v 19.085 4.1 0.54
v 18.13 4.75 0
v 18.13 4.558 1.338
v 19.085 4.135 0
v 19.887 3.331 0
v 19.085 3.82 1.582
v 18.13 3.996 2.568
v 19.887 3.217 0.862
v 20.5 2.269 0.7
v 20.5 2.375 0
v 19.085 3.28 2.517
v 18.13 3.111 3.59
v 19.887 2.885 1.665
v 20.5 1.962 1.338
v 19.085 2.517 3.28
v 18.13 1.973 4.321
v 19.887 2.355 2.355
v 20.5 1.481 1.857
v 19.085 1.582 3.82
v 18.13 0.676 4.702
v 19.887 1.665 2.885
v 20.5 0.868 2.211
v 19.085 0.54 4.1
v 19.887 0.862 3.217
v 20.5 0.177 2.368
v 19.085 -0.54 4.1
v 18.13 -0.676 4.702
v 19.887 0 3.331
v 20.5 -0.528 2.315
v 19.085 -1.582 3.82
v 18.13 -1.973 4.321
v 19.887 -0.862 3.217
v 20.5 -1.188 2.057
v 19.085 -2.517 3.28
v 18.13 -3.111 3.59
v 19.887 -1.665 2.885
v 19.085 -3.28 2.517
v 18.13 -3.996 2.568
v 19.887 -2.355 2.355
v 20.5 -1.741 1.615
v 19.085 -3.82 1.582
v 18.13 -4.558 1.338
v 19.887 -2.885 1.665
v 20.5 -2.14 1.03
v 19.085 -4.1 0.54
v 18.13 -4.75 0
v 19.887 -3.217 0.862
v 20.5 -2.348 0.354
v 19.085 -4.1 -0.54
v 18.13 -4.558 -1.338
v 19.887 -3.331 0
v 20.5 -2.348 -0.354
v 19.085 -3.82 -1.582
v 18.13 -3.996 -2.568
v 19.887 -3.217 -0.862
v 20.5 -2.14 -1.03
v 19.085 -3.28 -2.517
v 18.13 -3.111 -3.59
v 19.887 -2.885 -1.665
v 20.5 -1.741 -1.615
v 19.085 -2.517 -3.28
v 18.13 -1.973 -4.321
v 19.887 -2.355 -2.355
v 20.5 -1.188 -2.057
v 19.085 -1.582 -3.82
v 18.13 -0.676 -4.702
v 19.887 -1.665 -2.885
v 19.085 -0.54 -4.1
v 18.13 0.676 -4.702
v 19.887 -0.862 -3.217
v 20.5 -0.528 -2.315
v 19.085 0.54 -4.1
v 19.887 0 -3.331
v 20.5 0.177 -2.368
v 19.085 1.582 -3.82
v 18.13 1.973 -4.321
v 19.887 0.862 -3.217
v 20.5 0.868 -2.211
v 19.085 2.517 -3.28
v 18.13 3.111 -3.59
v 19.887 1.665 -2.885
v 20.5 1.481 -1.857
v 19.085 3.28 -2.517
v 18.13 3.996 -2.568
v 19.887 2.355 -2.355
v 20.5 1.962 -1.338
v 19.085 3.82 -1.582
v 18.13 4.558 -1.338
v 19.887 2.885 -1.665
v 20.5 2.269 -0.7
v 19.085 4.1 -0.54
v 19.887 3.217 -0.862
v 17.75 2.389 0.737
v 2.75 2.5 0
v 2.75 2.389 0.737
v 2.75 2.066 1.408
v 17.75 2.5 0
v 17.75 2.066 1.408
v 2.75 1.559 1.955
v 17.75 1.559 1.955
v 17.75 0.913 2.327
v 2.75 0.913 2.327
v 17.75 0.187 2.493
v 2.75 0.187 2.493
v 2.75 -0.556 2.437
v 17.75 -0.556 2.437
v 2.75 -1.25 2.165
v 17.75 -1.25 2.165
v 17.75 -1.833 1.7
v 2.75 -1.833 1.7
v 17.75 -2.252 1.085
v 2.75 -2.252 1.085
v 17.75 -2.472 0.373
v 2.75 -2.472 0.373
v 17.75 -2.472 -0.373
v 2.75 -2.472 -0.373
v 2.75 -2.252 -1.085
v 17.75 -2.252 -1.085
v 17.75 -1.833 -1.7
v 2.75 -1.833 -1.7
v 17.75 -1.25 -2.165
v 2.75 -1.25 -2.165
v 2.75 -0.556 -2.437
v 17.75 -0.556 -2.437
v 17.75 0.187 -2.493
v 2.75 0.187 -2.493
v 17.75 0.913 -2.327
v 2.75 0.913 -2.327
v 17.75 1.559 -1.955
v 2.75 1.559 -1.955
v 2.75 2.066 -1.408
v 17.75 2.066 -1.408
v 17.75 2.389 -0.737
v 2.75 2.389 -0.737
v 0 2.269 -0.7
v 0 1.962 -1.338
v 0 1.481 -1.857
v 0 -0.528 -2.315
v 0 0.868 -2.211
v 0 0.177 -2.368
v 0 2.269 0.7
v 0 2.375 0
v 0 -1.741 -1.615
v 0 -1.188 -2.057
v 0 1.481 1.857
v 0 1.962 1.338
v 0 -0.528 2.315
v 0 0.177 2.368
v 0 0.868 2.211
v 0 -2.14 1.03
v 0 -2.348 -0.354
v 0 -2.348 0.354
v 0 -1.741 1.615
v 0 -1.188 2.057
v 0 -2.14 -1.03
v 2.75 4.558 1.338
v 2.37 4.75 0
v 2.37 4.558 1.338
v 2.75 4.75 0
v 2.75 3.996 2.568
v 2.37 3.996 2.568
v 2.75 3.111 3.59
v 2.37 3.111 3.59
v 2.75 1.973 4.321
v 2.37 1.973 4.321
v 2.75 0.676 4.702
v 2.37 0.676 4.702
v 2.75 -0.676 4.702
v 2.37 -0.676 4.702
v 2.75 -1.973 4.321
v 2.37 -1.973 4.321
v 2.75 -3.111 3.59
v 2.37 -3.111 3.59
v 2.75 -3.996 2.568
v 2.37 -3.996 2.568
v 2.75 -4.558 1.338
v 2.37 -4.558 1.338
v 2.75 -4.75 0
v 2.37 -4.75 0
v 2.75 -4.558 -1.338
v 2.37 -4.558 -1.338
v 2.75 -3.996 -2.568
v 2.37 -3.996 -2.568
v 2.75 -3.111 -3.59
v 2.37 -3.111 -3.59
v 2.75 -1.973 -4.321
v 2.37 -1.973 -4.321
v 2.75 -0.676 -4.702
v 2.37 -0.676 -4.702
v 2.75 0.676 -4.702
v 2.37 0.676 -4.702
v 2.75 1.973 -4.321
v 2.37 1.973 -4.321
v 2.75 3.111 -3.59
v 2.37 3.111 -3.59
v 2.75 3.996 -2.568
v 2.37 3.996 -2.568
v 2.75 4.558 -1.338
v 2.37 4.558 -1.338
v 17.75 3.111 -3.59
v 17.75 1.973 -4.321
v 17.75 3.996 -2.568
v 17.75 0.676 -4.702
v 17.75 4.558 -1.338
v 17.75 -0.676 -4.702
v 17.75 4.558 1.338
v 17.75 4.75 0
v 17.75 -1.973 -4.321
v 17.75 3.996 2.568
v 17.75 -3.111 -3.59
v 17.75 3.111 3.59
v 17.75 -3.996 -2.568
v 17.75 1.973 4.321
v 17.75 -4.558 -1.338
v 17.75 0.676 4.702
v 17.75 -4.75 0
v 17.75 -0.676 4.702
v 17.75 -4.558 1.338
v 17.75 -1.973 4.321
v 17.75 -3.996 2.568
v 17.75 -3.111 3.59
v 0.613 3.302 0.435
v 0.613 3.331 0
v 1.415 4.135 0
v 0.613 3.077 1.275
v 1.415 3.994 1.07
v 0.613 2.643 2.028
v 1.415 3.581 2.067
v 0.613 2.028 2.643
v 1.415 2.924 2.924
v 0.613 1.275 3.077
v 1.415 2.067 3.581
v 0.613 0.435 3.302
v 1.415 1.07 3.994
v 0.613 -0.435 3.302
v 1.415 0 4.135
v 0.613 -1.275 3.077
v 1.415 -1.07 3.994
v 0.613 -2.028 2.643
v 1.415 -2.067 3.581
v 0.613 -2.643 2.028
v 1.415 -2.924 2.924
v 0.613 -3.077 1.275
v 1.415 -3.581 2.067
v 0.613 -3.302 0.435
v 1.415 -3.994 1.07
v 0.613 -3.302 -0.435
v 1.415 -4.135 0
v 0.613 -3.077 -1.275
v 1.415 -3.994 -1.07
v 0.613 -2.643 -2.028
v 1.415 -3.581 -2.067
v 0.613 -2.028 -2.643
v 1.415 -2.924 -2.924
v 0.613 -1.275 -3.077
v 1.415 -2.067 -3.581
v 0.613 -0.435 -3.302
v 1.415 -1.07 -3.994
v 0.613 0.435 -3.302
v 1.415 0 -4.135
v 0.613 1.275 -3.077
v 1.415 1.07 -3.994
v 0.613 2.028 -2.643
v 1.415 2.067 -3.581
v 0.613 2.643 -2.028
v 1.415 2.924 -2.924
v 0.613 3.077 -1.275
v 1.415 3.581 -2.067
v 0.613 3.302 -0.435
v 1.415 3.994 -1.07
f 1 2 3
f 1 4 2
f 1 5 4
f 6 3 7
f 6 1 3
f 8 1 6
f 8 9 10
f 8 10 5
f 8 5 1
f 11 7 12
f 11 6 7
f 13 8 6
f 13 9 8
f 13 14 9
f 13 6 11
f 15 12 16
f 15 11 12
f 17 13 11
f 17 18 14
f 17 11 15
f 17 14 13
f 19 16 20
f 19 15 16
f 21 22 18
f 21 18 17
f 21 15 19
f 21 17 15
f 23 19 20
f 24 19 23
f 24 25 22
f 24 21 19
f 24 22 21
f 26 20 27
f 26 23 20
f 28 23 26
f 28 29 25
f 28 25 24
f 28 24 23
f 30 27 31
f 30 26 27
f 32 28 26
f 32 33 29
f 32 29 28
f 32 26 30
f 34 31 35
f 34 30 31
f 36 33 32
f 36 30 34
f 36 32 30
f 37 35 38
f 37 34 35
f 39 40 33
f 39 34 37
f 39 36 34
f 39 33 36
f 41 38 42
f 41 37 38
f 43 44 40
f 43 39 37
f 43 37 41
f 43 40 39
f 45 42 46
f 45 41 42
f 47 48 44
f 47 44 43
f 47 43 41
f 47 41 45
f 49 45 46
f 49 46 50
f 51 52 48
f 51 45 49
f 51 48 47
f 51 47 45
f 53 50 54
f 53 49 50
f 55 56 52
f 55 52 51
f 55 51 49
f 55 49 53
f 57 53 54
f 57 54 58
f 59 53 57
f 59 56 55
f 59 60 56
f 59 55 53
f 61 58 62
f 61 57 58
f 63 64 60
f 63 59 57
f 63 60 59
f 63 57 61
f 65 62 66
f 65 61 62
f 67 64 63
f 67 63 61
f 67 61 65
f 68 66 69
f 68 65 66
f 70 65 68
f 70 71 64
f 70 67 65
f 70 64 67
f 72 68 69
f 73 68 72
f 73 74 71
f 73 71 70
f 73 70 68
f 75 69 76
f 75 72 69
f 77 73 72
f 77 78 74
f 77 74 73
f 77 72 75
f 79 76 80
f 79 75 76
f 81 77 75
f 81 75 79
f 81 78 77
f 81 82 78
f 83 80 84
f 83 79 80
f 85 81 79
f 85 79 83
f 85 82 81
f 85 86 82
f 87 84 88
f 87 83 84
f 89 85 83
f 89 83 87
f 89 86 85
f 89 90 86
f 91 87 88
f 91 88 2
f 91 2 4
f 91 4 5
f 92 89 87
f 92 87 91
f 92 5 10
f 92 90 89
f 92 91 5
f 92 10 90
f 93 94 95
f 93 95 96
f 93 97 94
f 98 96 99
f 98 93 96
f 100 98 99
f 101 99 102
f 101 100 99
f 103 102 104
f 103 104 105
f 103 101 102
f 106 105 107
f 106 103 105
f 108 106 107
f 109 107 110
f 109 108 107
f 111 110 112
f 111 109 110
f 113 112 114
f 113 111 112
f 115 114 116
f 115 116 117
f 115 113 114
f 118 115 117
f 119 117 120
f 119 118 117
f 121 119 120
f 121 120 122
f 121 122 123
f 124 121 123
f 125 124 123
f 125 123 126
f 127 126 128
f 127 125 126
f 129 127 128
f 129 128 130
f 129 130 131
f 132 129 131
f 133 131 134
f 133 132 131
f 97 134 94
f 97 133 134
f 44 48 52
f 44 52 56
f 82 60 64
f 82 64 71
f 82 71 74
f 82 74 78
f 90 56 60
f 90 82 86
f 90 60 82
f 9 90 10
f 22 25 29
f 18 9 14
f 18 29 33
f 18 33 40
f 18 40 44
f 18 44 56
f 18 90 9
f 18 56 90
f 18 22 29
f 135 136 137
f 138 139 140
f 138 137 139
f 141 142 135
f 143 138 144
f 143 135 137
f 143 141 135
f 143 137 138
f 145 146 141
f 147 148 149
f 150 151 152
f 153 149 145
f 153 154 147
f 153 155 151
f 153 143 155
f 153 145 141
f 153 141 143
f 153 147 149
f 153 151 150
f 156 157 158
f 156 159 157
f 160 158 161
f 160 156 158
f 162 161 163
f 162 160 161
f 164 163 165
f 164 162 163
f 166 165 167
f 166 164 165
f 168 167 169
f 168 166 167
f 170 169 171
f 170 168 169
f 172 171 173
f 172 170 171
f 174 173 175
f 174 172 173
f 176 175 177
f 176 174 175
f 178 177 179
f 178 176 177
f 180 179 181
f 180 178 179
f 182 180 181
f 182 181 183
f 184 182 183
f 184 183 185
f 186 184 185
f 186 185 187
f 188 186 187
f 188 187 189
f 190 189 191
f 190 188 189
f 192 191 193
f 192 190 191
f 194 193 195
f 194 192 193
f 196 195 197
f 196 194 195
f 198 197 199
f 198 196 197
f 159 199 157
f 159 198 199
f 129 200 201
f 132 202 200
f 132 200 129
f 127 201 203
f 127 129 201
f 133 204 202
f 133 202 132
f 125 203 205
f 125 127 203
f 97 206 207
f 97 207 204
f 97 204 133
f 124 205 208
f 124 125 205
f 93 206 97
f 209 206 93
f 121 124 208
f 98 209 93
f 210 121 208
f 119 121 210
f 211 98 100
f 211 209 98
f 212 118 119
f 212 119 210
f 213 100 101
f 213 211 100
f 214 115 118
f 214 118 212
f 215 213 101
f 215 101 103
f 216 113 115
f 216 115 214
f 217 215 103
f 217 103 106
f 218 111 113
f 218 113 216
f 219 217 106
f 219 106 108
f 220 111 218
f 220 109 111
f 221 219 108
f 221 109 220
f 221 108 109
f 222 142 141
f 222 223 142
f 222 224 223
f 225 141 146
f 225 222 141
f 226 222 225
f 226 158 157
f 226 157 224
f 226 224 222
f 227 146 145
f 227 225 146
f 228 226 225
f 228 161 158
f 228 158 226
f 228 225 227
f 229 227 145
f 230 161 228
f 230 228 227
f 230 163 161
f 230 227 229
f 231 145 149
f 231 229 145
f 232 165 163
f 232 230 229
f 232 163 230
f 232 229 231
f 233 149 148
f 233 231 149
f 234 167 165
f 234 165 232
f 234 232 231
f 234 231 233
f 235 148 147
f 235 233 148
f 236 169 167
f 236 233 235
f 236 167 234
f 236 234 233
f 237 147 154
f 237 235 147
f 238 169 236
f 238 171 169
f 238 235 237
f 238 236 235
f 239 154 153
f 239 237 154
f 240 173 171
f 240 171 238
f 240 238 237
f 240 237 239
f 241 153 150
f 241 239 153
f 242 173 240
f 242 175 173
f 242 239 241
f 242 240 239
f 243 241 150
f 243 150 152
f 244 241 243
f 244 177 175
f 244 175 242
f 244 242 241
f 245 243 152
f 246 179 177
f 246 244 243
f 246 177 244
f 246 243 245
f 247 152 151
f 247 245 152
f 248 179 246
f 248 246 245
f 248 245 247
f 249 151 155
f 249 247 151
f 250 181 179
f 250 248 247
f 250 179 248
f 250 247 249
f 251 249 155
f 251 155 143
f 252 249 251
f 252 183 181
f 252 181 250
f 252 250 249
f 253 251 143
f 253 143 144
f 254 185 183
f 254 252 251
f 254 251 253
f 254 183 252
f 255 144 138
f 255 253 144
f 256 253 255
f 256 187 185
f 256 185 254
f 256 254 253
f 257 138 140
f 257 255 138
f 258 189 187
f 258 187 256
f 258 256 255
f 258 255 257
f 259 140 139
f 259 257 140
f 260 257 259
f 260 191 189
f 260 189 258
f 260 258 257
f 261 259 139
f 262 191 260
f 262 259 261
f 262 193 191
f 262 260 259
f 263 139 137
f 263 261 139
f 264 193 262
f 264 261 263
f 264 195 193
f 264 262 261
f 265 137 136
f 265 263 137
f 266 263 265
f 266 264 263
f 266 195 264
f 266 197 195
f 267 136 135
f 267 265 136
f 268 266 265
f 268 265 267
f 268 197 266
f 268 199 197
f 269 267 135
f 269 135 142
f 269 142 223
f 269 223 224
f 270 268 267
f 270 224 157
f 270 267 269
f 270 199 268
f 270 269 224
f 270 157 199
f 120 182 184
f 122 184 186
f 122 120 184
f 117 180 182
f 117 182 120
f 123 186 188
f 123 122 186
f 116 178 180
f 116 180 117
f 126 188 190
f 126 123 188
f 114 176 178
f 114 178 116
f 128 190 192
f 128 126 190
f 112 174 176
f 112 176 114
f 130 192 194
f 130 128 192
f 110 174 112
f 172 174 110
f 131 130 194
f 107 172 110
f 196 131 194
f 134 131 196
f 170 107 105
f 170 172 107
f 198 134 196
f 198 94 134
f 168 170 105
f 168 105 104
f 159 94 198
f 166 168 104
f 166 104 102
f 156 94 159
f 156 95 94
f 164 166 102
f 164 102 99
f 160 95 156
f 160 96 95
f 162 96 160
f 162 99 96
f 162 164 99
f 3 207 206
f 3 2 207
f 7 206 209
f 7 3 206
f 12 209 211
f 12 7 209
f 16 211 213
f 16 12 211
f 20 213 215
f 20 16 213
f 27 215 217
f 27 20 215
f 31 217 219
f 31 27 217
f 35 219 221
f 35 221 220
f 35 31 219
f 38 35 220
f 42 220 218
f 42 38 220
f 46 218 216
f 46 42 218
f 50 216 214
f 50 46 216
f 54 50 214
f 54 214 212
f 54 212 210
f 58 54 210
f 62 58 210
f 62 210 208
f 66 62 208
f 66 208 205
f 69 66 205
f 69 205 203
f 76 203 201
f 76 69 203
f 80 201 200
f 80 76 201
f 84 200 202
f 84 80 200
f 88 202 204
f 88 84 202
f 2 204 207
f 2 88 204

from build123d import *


with BuildPart() as part:
    # Sketch2 → Revolve1 (revolve)
    with BuildSketch(Plane.XY):
        with BuildLine():
            ThreePointArc((0, 2.375), (0.992680215, 3.754414901), (2.37, 4.75))
            Line((2.37, 4.75), (2.75, 4.75))
            Line((2.75, 4.75), (2.75, 2.5))
            Line((2.75, 2.5), (17.75, 2.5))
            Line((17.75, 2.5), (17.75, 4.75))
            Line((17.75, 4.75), (18.13, 4.75))
            ThreePointArc((18.13, 4.75), (19.507319785, 3.754414901), (20.5, 2.375))
            Line((20.5, 2.375), (20.5, 0))
            Line((20.5, 0), (0, 0))
            Line((0, 0), (0, 2.375))
        make_face()
    revolve(axis=Axis((-1.178114582, 0, 0), (1, 0, 0)))


solid = part.part
